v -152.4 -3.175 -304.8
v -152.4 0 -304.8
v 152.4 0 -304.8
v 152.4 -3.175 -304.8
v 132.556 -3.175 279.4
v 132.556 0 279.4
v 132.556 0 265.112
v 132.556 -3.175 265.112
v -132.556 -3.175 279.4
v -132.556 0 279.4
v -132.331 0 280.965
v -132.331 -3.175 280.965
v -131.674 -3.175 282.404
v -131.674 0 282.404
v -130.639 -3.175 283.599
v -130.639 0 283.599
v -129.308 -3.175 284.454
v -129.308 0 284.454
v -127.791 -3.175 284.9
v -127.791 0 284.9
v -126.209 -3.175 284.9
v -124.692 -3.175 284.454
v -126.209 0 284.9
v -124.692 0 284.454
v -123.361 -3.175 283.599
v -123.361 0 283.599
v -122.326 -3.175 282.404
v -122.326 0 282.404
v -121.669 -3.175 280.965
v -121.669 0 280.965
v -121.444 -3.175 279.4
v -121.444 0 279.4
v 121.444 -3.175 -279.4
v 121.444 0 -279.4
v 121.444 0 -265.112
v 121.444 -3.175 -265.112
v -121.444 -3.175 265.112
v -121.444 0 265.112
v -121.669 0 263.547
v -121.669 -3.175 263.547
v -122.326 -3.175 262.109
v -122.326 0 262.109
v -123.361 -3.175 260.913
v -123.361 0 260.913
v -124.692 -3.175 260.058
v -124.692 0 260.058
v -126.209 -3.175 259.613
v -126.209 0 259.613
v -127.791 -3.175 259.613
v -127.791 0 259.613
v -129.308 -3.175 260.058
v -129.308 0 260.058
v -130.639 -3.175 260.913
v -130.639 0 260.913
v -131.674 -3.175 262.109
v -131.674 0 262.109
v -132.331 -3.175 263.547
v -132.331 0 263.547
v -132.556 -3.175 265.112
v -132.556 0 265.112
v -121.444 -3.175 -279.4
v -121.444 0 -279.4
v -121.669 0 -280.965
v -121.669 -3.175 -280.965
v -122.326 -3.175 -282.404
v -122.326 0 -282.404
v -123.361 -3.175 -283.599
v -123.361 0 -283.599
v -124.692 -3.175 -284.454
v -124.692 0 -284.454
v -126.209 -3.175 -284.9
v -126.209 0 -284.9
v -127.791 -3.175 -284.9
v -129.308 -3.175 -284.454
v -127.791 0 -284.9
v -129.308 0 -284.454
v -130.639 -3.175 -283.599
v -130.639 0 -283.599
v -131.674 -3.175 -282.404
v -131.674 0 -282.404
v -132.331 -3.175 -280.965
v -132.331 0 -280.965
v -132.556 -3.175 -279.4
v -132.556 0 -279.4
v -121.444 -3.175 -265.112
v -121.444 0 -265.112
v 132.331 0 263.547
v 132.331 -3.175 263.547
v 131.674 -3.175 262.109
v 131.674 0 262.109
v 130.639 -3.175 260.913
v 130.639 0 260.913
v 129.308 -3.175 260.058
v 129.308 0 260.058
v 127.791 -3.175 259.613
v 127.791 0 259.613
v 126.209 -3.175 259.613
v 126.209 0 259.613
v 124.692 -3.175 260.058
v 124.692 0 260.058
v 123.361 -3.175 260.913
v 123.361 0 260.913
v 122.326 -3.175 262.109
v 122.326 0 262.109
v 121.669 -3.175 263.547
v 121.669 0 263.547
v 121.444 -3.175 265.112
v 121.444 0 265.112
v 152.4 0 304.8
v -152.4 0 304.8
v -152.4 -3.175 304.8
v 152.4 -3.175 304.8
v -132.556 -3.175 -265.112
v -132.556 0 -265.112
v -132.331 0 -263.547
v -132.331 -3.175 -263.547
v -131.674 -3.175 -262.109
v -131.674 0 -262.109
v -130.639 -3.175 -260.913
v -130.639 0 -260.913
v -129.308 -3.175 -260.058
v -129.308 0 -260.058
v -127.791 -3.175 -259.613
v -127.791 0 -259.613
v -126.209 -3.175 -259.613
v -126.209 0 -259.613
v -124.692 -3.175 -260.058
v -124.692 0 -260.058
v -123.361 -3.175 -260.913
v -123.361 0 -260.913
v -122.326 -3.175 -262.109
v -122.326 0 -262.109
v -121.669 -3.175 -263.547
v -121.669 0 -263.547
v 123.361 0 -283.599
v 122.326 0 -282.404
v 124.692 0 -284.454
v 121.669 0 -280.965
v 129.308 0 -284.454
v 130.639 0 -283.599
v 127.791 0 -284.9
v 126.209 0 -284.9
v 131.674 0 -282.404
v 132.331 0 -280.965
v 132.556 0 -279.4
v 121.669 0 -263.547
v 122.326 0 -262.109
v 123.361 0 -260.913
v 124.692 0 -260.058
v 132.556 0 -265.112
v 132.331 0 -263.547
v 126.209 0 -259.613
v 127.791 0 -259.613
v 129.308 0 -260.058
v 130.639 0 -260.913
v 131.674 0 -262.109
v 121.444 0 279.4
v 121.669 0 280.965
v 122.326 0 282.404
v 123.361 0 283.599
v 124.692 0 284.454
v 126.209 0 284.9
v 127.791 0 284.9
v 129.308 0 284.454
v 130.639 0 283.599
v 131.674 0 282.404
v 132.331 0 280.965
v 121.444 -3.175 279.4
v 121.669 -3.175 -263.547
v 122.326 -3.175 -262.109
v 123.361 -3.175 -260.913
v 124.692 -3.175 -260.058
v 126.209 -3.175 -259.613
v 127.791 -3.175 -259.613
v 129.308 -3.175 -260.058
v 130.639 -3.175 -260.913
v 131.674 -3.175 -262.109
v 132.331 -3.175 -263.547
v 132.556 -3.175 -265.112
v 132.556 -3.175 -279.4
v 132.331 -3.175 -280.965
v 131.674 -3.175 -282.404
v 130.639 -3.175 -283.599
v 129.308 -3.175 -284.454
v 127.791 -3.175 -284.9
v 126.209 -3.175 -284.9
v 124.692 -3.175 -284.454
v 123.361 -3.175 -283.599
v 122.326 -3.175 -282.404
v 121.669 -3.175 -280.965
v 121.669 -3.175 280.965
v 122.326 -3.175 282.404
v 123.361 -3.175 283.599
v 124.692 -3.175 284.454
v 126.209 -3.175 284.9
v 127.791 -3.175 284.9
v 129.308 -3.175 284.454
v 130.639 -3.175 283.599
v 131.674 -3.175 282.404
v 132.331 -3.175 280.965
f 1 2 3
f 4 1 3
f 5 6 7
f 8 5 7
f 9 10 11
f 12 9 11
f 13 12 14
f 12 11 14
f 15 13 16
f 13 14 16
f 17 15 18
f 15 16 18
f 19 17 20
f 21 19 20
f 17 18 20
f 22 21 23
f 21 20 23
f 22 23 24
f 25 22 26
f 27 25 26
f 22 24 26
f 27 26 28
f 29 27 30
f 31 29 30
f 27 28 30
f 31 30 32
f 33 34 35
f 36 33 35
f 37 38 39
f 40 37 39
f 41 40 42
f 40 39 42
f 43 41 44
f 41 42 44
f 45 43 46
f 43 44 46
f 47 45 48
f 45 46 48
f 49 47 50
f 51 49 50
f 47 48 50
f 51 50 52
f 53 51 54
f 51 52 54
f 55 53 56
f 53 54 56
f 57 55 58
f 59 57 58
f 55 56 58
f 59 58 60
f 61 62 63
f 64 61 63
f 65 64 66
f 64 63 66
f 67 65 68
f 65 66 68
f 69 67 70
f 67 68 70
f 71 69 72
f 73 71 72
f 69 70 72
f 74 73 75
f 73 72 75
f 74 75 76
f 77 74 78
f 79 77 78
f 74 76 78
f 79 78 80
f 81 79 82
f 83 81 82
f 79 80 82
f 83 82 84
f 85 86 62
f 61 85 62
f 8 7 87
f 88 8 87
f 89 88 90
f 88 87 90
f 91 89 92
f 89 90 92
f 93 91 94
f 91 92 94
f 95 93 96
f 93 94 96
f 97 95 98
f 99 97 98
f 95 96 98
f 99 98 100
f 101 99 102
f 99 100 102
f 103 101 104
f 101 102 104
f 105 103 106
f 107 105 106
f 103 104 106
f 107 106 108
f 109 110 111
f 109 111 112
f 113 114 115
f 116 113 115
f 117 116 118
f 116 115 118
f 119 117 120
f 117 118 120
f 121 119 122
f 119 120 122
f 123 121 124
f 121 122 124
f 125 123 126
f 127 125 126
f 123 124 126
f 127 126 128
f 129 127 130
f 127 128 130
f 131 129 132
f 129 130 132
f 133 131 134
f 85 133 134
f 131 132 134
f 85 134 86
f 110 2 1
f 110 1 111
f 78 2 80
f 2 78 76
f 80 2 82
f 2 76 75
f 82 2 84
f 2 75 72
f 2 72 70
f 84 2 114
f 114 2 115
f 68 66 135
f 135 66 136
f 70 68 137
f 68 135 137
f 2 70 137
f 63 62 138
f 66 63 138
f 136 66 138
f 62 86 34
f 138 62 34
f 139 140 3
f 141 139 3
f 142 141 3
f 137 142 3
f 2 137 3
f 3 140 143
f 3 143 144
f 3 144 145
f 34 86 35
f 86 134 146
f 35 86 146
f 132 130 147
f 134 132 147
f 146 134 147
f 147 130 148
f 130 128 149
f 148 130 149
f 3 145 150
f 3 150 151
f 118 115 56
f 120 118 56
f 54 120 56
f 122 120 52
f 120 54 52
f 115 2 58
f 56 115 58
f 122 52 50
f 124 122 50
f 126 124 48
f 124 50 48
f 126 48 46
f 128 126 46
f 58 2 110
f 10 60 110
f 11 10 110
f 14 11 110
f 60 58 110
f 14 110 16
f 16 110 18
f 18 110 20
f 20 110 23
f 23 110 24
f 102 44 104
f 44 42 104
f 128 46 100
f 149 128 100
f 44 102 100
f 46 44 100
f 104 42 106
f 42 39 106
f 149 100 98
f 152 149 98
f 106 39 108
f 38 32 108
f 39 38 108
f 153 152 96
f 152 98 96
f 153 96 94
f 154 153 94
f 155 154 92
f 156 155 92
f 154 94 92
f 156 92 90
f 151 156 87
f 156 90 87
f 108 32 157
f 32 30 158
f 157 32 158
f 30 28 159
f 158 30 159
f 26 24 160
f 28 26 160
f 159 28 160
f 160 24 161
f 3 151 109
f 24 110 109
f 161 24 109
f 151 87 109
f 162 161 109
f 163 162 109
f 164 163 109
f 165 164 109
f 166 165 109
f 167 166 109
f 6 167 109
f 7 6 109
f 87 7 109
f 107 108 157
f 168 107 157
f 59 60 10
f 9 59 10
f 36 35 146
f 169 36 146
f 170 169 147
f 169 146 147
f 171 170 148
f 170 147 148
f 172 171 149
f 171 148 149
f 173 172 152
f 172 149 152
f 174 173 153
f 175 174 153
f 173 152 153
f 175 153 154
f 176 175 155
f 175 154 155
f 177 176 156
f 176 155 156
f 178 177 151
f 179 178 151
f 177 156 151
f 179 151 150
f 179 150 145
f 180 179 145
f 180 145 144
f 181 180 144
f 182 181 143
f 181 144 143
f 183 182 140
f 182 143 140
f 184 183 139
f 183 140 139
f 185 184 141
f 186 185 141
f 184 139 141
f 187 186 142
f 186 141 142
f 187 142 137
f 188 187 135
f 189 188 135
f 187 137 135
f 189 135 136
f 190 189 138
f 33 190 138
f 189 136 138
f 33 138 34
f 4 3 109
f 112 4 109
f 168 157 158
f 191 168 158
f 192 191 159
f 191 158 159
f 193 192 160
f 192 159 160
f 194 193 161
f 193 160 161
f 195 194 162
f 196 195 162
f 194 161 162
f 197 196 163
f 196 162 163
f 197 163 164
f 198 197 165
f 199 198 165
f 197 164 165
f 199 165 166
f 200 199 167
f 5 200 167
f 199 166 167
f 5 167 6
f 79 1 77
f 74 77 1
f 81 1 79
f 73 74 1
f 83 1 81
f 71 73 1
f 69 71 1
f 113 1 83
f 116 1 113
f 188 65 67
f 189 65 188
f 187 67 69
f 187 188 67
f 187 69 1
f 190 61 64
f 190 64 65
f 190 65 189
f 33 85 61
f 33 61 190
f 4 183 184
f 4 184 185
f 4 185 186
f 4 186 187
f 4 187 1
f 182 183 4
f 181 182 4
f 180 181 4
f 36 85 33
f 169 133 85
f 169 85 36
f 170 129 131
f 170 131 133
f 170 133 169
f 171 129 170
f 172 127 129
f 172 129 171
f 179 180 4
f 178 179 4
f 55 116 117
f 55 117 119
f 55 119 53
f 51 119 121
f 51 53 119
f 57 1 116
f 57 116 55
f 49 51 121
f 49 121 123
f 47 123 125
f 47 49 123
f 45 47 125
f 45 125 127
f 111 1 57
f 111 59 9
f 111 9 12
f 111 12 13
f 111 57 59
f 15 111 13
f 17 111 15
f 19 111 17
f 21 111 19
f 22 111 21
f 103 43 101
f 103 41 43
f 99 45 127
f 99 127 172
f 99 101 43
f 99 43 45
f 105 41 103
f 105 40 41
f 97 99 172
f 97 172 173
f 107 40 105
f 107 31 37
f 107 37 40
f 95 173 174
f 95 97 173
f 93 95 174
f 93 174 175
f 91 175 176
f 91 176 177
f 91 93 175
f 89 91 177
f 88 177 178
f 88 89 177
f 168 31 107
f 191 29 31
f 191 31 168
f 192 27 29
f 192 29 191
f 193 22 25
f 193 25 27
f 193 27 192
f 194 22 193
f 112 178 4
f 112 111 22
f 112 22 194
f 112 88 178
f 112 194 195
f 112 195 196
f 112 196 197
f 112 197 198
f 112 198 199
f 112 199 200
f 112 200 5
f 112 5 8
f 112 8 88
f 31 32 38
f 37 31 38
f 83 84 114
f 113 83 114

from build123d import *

# Parameters (mm, degrees)
F0_W     = 304.8
F0_H     = 609.6
F1_DEPTH = 3.175


with BuildPart() as f1:
    # F0 (on Front) → F1 (new body)
    with BuildSketch(Plane.XZ):
        Rectangle(F0_W, F0_H)
        with BuildLine():
            ThreePointArc((-121.44375, -279.4), (-127, -284.95625), (-132.55625, -279.4))
            Line((-132.55625, -279.4), (-132.55625, -265.1125))
            ThreePointArc((-132.55625, -265.1125), (-127, -259.55625), (-121.44375, -265.1125))
            Line((-121.44375, -265.1125), (-121.44375, -279.4))
        make_face(mode=Mode.SUBTRACT)
        with BuildLine():
            ThreePointArc((132.55625, -279.4), (127, -284.95625), (121.44375, -279.4))
            Line((121.44375, -279.4), (121.44375, -265.1125))
            ThreePointArc((121.44375, -265.1125), (127, -259.55625), (132.55625, -265.1125))
            Line((132.55625, -265.1125), (132.55625, -279.4))
        make_face(mode=Mode.SUBTRACT)
        with BuildLine():
            ThreePointArc((-132.55625, 279.4), (-127, 284.95625), (-121.44375, 279.4))
            Line((-121.44375, 279.4), (-121.44375, 265.1125))
            ThreePointArc((-121.44375, 265.1125), (-127, 259.55625), (-132.55625, 265.1125))
            Line((-132.55625, 265.1125), (-132.55625, 279.4))
        make_face(mode=Mode.SUBTRACT)
        with BuildLine():
            ThreePointArc((121.44375, 279.4), (127, 284.95625), (132.55625, 279.4))
            Line((132.55625, 279.4), (132.55625, 265.1125))
            ThreePointArc((132.55625, 265.1125), (127, 259.55625), (121.44375, 265.1125))
            Line((121.44375, 265.1125), (121.44375, 279.4))
        make_face(mode=Mode.SUBTRACT)
    extrude(amount=F1_DEPTH)


solid = f1.part
